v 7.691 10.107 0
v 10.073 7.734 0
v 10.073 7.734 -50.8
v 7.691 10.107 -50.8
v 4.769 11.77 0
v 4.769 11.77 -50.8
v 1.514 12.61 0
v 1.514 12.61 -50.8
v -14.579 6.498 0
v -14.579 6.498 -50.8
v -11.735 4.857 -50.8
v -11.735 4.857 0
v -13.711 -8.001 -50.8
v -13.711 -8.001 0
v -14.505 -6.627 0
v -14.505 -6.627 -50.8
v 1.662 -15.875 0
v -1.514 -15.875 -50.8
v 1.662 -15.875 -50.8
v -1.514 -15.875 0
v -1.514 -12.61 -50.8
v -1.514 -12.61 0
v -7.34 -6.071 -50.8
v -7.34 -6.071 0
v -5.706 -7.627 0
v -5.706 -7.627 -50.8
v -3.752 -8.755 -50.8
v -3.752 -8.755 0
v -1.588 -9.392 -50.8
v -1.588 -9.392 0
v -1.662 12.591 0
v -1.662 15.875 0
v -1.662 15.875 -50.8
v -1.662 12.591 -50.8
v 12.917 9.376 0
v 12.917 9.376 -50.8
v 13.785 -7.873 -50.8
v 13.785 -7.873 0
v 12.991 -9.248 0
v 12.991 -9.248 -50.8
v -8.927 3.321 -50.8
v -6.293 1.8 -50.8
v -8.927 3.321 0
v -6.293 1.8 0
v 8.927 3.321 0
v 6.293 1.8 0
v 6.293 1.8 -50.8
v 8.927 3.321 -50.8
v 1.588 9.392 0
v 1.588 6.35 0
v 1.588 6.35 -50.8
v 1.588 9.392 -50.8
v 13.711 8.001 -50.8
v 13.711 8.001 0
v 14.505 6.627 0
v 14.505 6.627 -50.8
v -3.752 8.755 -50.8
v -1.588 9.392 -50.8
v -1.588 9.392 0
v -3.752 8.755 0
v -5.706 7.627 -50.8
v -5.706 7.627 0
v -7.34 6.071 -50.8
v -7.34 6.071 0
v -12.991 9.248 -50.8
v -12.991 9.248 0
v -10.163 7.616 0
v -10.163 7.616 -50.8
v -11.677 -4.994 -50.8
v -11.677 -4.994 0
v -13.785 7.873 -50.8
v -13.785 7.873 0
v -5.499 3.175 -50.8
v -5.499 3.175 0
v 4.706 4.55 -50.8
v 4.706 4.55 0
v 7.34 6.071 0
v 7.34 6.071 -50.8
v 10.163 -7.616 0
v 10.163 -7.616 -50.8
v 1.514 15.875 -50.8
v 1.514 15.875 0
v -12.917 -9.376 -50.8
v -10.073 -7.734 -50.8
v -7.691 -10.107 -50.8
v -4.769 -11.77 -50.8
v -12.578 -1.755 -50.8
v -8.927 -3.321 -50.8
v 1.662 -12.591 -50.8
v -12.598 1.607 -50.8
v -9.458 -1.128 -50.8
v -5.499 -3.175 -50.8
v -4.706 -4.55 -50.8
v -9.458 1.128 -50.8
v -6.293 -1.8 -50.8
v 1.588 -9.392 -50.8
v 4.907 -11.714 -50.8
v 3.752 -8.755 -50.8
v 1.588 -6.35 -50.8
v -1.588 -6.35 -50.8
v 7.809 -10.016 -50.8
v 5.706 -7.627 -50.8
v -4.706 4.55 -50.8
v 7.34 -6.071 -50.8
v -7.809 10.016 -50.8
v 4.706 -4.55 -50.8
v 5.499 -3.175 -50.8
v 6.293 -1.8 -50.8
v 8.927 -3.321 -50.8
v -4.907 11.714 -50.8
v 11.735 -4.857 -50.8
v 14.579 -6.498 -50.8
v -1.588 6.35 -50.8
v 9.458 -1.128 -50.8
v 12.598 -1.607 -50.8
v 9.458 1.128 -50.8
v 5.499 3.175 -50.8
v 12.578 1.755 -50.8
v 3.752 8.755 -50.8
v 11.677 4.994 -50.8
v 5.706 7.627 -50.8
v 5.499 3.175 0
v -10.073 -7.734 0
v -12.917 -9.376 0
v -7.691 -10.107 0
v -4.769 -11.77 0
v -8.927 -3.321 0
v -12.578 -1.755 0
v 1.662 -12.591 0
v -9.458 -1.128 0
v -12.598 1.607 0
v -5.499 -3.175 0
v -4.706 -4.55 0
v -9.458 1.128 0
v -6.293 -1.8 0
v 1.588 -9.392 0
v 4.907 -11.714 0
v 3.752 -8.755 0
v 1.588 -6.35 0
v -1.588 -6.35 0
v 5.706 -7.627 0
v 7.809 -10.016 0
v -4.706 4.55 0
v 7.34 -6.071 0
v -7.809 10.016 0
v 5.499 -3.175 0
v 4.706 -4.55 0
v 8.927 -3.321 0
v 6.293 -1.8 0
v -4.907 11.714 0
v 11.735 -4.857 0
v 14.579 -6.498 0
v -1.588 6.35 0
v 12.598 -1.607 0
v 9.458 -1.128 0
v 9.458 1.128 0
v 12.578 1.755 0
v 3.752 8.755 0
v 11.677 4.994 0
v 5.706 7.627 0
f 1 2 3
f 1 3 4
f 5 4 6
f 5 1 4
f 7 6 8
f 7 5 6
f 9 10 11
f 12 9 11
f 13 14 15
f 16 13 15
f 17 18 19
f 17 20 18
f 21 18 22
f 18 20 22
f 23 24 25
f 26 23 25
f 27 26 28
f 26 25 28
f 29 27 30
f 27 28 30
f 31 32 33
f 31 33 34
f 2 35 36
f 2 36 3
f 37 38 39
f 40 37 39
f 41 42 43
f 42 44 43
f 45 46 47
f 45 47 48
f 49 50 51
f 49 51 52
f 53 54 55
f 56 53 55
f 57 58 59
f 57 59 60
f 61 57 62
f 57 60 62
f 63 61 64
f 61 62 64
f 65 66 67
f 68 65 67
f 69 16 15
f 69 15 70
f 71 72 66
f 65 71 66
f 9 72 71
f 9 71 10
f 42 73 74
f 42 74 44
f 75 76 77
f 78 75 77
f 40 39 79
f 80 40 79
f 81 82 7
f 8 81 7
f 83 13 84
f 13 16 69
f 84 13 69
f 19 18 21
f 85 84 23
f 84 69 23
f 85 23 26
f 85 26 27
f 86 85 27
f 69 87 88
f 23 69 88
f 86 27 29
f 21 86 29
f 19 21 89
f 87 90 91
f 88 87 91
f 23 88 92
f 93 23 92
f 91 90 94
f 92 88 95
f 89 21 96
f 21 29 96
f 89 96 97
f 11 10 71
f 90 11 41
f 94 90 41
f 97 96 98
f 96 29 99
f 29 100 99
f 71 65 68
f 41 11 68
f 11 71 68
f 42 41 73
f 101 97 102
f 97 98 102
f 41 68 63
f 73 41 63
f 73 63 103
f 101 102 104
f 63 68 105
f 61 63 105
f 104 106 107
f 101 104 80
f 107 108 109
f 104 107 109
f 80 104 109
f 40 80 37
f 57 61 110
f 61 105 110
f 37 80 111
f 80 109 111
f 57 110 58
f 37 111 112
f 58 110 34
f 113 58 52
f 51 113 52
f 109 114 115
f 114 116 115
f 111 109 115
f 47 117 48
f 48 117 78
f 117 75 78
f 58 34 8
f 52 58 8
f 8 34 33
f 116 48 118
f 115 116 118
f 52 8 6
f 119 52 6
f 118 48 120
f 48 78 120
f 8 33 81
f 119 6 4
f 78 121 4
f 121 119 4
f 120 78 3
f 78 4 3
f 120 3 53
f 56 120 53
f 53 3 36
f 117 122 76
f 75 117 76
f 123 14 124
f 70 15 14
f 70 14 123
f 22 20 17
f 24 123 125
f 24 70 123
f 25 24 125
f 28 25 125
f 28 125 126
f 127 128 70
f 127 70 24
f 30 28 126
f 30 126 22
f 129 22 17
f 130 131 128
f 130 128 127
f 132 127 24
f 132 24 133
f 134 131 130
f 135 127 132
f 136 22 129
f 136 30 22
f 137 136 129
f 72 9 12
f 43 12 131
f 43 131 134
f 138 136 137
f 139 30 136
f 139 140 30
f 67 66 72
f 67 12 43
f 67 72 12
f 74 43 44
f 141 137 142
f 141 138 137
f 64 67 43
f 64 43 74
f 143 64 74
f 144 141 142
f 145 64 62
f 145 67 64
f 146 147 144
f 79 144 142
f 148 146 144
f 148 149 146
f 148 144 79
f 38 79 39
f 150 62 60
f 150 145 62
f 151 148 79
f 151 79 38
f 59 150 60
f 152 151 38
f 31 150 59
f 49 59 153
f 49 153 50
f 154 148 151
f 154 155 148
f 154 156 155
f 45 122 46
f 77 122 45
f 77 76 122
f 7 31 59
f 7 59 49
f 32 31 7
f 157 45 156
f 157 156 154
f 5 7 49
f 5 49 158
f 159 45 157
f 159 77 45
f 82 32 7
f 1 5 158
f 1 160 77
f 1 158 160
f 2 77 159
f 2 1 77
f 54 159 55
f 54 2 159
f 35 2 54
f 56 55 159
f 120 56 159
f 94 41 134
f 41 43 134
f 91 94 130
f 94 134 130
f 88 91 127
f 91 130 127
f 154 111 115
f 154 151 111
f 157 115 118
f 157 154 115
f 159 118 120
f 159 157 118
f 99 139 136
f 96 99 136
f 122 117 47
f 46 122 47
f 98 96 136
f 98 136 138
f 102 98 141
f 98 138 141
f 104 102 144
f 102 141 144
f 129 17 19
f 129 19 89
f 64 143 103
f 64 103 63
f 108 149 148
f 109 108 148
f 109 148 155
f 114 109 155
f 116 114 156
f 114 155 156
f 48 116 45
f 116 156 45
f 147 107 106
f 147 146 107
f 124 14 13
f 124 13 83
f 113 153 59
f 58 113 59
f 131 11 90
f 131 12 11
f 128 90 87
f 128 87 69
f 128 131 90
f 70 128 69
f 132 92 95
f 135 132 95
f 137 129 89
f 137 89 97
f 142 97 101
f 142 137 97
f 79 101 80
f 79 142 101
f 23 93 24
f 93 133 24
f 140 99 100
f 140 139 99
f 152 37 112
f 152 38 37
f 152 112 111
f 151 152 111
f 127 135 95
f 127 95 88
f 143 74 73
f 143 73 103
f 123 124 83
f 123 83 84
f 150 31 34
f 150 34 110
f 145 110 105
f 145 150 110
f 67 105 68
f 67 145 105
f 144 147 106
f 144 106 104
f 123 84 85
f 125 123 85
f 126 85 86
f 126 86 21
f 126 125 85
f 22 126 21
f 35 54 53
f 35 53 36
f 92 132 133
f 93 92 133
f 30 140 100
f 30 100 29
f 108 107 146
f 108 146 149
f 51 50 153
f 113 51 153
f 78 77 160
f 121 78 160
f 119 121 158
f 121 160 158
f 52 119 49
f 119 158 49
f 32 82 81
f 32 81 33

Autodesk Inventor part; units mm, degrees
ref_plane "YZ Plane" through (0, 0, 0) normal (1, 0, 0) x (0, 1, 0)
ref_plane "XZ Plane" through (0, 0, 0) normal (0, 1, 0) x (-1, 0, 0)
ref_plane "XY Plane" through (0, 0, 0) normal (0, 0, 1) x (1, 0, 0)
sketch "Sketch1" plane through (0, 0, 0) normal (0, 0, 1) x (1, 0, 0)
  circle A0 centre (0, 0) radius 12.7
  line L0 (-0.074, 12.6998) -> (-0.074, 15.8748) construction
  line L1 (-0.074, 15.8748) -> (1.5135, 15.8748)
  line L2 (1.5135, 15.8748) -> (1.5135, 12.6095)
  line L3 (-0.074, 15.8748) -> (-1.6615, 15.8748)
  line L4 (-1.6615, 15.8748) -> (-1.6615, 12.5909)
  line L5 (-14.5787, 6.4985) -> (-11.7347, 4.8566)
  line L6 (-13.7849, 7.8733) -> (-14.5787, 6.4985)
  line L7 (-13.7849, 7.8733) -> (-12.9912, 9.2482)
  line L8 (-12.9912, 9.2482) -> (-10.1634, 7.6155)
  line L9 (-12.9172, -9.3763) -> (-10.0733, -7.7343)
  line L10 (-13.711, -8.0014) -> (-12.9172, -9.3763)
  line L11 (-13.711, -8.0014) -> (-14.5047, -6.6266)
  line L12 (-14.5047, -6.6266) -> (-11.6769, -4.994)
  line L13 (1.6615, -15.8748) -> (1.6615, -12.5909)
  line L14 (0.074, -15.8748) -> (1.6615, -15.8748)
  line L15 (0.074, -15.8748) -> (-1.5135, -15.8748)
  line L16 (-1.5135, -15.8748) -> (-1.5135, -12.6095)
  line L17 (14.5787, -6.4985) -> (11.7347, -4.8566)
  line L18 (13.7849, -7.8733) -> (14.5787, -6.4985)
  line L19 (13.7849, -7.8733) -> (12.9912, -9.2482)
  line L20 (12.9912, -9.2482) -> (10.1634, -7.6155)
  line L21 (12.9172, 9.3763) -> (10.0733, 7.7343)
  line L22 (13.711, 8.0014) -> (12.9172, 9.3763)
  line L23 (13.711, 8.0014) -> (14.5047, 6.6266)
  line L24 (14.5047, 6.6266) -> (11.6769, 4.994)
  line L25 (0, 0) -> (0, 9.525) construction
  line L26 (0, 6.35) -> (1.5875, 6.35)
  line L27 (1.5875, 6.35) -> (1.5875, 9.3918)
  line L28 (0, 6.35) -> (-1.5875, 6.35)
  line L29 (-1.5875, 6.35) -> (-1.5875, 9.3918)
  line L30 (-6.293, 1.8002) -> (-8.9273, 3.3211)
  line L31 (-5.4993, 3.175) -> (-6.293, 1.8002)
  line L32 (-5.4993, 3.175) -> (-4.7055, 4.5498)
  line L33 (-4.7055, 4.5498) -> (-7.3398, 6.0707)
  line L34 (-4.7055, -4.5498) -> (-7.3398, -6.0707)
  line L35 (-5.4993, -3.175) -> (-4.7055, -4.5498)
  line L36 (-5.4993, -3.175) -> (-6.293, -1.8002)
  line L37 (-6.293, -1.8002) -> (-8.9273, -3.3211)
  line L38 (1.5875, -6.35) -> (1.5875, -9.3918)
  line L39 (0, -6.35) -> (1.5875, -6.35)
  line L40 (0, -6.35) -> (-1.5875, -6.35)
  line L41 (-1.5875, -6.35) -> (-1.5875, -9.3918)
  line L42 (6.293, -1.8002) -> (8.9273, -3.3211)
  line L43 (5.4993, -3.175) -> (6.293, -1.8002)
  line L44 (5.4993, -3.175) -> (4.7055, -4.5498)
  line L45 (4.7055, -4.5498) -> (7.3398, -6.0707)
  line L46 (4.7055, 4.5498) -> (7.3398, 6.0707)
  line L47 (5.4993, 3.175) -> (4.7055, 4.5498)
  line L48 (5.4993, 3.175) -> (6.293, 1.8002)
  line L49 (6.293, 1.8002) -> (8.9273, 3.3211)
  arc A1 (7.3398, 6.0707) -> (1.5875, 9.3918) centre (0, 0) ccw
  arc A2 (8.9273, -3.3211) -> (8.9273, 3.3211) centre (0, 0) ccw
  arc A3 (1.5875, -9.3918) -> (7.3398, -6.0707) centre (0, 0) ccw
  arc A4 (-7.3398, -6.0707) -> (-1.5875, -9.3918) centre (0, 0) ccw
  arc A5 (-1.5875, 9.3918) -> (-7.3398, 6.0707) centre (0, 0) ccw
  arc A6 (-8.9273, 3.3211) -> (-8.9273, -3.3211) centre (0, 0) ccw
  dimension "outerDiameter" = 25.4
  dimension "splineHeight" = 3.175
  dimension "splineWidth" = 3.175
  dimension "d16" = 360
  dimension "d20" = 3.175
  dimension "d21" = 3.175
  dimension "d24" = 360
extrude "Extrusion4" add sketch "Sketch1" against normal blind 50.8
equation "\"d20\" = splineHeight"
equation "\"d21\" = splineWidth"
properties part number "outerShaft" material "PET Plastic"
